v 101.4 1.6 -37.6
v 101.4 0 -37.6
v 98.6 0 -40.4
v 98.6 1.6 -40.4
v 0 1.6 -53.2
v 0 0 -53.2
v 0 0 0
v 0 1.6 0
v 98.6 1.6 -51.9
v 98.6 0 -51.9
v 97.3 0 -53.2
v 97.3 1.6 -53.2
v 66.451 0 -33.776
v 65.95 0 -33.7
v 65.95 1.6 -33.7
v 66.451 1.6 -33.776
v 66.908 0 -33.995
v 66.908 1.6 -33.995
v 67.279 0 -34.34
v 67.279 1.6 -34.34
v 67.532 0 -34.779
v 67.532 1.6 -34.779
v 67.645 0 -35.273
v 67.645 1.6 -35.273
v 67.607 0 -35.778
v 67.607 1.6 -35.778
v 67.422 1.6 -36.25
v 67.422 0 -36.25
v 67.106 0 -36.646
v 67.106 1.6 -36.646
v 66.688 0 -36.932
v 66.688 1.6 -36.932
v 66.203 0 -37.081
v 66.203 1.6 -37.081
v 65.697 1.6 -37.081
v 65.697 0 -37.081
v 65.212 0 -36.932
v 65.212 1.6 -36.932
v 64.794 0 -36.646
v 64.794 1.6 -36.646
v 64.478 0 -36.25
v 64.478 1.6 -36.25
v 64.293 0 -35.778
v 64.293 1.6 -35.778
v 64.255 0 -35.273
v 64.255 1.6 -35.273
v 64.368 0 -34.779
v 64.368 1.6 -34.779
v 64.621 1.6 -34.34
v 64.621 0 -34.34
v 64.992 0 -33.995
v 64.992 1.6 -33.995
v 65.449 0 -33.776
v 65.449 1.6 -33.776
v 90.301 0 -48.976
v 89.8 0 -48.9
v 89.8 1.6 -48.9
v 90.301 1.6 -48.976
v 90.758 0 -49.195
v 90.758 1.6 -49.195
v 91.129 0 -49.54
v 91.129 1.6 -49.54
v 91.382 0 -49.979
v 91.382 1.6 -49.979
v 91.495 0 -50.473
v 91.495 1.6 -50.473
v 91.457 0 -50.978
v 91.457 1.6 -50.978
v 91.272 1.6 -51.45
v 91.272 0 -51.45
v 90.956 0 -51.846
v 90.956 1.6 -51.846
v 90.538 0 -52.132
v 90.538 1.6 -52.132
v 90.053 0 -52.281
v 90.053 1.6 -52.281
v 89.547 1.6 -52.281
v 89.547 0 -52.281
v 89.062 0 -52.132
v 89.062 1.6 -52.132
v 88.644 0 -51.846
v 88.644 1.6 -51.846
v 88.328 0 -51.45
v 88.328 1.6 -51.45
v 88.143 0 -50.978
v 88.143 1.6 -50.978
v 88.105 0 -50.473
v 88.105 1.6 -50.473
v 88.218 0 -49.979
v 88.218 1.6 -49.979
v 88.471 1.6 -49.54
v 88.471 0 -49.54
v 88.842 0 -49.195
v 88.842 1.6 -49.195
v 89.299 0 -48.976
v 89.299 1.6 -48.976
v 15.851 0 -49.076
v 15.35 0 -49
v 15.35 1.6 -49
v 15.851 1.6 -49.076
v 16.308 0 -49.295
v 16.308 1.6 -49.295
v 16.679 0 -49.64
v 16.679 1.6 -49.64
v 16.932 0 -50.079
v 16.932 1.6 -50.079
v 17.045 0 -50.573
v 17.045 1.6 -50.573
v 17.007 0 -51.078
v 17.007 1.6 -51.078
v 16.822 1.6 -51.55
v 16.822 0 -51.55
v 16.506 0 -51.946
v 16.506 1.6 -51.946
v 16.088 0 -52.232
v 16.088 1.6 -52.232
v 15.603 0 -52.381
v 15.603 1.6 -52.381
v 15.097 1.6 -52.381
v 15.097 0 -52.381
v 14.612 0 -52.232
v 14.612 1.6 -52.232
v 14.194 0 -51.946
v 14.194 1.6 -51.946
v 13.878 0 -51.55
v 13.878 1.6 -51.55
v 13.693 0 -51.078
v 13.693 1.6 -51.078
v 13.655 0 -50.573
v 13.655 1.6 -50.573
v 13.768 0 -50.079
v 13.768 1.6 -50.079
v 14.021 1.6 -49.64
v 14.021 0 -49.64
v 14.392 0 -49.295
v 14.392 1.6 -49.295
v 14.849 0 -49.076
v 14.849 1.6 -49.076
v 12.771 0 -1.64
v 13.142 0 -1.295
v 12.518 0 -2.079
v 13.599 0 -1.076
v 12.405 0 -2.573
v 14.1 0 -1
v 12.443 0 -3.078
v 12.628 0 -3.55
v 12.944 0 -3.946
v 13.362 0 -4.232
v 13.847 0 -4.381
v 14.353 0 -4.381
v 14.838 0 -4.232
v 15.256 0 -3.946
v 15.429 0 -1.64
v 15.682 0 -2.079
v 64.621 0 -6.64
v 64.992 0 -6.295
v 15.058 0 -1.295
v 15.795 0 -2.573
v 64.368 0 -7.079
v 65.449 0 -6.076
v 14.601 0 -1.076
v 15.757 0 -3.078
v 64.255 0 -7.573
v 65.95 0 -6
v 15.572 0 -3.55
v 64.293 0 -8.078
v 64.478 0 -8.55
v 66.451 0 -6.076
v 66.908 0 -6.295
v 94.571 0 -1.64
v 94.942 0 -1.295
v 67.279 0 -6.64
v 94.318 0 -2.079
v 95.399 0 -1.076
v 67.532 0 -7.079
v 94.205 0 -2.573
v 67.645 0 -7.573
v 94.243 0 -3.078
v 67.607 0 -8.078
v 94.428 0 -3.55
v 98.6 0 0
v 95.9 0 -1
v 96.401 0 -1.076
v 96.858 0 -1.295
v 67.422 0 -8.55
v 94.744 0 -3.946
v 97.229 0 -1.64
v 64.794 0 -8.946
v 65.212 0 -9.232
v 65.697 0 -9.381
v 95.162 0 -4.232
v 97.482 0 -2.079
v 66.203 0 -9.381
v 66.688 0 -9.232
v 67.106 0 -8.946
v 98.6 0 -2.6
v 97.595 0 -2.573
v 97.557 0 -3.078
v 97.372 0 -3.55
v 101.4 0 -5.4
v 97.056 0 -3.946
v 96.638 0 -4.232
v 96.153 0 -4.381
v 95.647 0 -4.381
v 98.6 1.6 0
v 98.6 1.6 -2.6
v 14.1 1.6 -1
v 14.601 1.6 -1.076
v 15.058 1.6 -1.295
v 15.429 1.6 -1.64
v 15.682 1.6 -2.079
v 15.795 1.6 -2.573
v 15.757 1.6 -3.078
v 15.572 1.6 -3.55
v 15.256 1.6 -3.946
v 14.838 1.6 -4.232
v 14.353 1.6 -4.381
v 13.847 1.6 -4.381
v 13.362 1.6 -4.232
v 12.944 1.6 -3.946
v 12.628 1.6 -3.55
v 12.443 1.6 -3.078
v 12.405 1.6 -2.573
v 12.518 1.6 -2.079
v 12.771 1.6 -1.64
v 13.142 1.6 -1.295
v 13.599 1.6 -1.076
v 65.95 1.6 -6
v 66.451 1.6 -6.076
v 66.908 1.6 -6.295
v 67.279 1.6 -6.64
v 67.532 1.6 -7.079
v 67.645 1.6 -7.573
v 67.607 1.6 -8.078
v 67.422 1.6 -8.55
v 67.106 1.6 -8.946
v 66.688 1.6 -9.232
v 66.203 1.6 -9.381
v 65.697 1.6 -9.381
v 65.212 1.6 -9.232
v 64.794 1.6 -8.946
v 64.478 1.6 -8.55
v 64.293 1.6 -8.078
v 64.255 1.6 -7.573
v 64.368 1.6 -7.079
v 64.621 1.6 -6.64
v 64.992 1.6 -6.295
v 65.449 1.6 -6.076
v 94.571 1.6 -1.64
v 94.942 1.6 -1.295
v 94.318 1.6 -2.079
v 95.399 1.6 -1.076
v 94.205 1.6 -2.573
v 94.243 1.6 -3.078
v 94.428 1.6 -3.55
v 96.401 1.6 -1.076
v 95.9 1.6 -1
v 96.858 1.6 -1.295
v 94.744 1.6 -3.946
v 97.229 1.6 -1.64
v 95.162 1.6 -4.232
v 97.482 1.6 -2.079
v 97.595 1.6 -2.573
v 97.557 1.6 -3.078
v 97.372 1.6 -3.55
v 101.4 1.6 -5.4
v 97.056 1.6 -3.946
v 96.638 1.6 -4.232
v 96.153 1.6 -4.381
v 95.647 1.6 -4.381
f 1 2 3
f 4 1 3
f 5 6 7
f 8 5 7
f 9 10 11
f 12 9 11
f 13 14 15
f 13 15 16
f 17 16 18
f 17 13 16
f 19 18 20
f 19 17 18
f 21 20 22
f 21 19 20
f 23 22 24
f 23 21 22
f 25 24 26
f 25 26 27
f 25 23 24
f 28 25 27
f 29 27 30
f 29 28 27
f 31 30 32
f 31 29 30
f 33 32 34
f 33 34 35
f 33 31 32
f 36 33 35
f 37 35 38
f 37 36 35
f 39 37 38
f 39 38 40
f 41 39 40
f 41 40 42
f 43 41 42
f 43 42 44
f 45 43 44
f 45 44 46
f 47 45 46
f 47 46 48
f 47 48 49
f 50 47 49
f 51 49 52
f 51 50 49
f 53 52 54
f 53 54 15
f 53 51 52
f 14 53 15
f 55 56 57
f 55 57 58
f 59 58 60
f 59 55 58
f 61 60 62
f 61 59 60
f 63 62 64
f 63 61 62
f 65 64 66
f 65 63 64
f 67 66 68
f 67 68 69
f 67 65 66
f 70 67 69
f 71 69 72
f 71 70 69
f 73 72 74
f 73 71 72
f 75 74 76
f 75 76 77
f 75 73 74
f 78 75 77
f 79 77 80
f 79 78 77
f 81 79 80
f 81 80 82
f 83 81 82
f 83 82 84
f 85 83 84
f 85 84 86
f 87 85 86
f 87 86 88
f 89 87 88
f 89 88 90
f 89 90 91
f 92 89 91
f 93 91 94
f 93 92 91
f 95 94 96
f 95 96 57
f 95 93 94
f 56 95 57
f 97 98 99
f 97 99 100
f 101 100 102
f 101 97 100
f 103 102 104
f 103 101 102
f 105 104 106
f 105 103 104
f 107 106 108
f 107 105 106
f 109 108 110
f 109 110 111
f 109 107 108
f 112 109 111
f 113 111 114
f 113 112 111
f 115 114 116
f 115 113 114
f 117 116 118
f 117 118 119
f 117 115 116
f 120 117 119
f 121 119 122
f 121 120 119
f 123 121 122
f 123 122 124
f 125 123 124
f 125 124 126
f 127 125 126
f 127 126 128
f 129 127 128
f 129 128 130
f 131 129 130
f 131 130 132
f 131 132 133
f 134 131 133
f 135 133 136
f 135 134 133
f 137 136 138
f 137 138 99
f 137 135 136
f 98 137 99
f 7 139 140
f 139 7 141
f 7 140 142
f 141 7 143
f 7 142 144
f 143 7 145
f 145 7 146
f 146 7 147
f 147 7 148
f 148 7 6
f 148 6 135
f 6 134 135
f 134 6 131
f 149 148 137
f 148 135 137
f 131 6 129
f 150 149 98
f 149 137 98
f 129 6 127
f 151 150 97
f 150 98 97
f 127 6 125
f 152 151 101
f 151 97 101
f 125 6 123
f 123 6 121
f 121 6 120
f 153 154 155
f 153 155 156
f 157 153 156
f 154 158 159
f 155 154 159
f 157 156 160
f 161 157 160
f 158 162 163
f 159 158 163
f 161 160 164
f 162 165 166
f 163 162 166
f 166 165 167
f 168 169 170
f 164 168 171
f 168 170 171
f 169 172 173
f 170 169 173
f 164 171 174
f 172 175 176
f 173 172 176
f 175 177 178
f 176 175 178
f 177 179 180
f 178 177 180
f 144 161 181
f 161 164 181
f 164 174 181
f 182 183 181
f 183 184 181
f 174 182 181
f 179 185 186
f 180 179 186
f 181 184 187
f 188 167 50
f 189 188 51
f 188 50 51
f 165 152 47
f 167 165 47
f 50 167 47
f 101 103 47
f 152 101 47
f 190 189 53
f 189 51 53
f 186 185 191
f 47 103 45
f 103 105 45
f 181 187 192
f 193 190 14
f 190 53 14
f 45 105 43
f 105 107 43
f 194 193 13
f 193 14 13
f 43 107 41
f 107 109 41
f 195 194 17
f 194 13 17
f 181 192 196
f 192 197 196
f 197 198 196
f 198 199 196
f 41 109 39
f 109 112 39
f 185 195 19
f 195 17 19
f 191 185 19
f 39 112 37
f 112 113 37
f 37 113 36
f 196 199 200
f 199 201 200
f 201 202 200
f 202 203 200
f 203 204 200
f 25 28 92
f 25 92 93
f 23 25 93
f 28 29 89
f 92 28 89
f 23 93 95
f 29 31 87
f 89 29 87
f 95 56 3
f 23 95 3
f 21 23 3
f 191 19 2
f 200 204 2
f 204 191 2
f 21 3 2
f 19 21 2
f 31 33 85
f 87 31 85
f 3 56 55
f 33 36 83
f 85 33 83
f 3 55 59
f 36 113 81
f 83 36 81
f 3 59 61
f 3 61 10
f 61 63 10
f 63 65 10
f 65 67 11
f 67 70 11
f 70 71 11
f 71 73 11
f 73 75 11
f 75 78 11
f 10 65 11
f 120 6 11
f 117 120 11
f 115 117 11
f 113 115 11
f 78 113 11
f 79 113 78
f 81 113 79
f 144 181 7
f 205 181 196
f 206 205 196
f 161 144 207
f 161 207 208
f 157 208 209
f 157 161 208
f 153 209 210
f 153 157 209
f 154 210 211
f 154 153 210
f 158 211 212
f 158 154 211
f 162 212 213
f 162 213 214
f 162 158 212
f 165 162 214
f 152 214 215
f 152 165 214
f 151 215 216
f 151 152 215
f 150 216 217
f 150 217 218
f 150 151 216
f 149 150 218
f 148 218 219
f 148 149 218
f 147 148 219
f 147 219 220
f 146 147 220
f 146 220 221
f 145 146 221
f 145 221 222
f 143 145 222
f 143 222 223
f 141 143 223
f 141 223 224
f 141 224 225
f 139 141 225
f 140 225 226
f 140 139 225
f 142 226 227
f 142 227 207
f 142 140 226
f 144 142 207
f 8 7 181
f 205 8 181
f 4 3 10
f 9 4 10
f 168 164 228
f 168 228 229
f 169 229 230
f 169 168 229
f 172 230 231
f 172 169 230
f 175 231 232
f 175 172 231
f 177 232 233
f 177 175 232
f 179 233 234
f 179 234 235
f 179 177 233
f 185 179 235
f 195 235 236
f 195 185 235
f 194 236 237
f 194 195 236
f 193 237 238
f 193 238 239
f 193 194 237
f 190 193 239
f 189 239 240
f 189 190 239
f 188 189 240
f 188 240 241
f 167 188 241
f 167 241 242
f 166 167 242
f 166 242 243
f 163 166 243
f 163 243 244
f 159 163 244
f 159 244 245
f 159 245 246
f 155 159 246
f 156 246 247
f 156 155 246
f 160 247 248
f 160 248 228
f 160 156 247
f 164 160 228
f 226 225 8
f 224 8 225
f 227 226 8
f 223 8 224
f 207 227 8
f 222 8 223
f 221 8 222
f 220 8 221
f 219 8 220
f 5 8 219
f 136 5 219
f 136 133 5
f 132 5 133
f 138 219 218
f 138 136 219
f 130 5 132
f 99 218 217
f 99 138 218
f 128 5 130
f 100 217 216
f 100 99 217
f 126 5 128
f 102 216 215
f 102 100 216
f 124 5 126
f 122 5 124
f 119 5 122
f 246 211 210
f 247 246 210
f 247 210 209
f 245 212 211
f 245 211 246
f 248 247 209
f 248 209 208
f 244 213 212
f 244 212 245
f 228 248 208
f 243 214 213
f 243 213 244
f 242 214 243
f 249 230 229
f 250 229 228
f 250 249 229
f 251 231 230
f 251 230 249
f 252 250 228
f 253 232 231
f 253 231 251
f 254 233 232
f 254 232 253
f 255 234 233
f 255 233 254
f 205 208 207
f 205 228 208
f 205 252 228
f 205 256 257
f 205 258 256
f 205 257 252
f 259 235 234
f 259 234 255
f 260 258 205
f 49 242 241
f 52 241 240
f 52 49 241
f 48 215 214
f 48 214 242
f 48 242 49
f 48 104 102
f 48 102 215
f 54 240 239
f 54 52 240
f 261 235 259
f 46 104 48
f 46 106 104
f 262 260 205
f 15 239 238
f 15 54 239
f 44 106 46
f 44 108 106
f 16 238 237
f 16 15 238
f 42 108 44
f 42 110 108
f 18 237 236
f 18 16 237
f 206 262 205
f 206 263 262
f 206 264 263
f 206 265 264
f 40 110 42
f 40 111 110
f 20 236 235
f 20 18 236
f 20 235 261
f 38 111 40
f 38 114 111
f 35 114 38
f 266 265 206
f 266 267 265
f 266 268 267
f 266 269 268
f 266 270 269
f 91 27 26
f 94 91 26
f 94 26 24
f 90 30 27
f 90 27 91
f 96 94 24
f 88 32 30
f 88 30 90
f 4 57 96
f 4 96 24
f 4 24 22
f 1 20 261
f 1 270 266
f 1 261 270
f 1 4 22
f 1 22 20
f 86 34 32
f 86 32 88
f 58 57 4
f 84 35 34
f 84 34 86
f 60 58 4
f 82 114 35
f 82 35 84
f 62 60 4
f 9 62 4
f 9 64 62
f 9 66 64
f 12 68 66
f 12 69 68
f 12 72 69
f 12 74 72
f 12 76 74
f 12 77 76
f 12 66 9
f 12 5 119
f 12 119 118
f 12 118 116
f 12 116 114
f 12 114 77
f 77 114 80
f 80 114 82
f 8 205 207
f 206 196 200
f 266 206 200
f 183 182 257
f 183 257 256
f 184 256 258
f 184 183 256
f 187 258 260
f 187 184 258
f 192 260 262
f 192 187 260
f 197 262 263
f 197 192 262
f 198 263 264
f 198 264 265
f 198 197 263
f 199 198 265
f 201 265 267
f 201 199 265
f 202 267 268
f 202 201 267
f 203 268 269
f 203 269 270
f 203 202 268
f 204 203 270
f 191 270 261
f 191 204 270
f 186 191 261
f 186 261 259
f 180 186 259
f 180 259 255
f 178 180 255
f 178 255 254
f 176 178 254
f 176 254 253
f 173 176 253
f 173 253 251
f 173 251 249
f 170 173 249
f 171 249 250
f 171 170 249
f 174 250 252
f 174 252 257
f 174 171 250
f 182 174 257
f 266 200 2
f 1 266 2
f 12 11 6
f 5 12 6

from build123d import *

# Parameters (mm, degrees)
SKETCH1_R           = 1.7
BOSS_EXTRUDE1_DEPTH = 1.6


with BuildPart() as part:
    # Sketch1 → Boss-Extrude1 (new body)
    with BuildSketch(Plane(origin=(0, 0, 0), x_dir=(1, 0, 0), z_dir=(0, 1, 0))):
        Polygon((98.6, 0), (98.6, 2.6), (101.4, 5.4), (101.4, 37.6), (98.6, 40.4), (98.6, 51.9), (97.3, 53.2), (0, 53.2), (0, 0), align=None)
        with Locations(Location((95.9, 2.7, 0), (0, 0, 270))):
            Circle(SKETCH1_R, mode=Mode.SUBTRACT)
        with Locations(Location((89.8, 50.6, 0), (0, 0, 270))):
            Circle(SKETCH1_R, mode=Mode.SUBTRACT)
        with Locations(Location((65.95, 35.4, 0), (0, 0, 270))):
            Circle(SKETCH1_R, mode=Mode.SUBTRACT)
        with Locations(Location((65.95, 7.7, 0), (0, 0, 270))):
            Circle(SKETCH1_R, mode=Mode.SUBTRACT)
        with Locations(Location((15.35, 50.7, 0), (0, 0, 270))):
            Circle(SKETCH1_R, mode=Mode.SUBTRACT)
        with Locations(Location((14.1, 2.7, 0), (0, 0, 270))):
            Circle(SKETCH1_R, mode=Mode.SUBTRACT)
    extrude(amount=BOSS_EXTRUDE1_DEPTH)


solid = part.part
